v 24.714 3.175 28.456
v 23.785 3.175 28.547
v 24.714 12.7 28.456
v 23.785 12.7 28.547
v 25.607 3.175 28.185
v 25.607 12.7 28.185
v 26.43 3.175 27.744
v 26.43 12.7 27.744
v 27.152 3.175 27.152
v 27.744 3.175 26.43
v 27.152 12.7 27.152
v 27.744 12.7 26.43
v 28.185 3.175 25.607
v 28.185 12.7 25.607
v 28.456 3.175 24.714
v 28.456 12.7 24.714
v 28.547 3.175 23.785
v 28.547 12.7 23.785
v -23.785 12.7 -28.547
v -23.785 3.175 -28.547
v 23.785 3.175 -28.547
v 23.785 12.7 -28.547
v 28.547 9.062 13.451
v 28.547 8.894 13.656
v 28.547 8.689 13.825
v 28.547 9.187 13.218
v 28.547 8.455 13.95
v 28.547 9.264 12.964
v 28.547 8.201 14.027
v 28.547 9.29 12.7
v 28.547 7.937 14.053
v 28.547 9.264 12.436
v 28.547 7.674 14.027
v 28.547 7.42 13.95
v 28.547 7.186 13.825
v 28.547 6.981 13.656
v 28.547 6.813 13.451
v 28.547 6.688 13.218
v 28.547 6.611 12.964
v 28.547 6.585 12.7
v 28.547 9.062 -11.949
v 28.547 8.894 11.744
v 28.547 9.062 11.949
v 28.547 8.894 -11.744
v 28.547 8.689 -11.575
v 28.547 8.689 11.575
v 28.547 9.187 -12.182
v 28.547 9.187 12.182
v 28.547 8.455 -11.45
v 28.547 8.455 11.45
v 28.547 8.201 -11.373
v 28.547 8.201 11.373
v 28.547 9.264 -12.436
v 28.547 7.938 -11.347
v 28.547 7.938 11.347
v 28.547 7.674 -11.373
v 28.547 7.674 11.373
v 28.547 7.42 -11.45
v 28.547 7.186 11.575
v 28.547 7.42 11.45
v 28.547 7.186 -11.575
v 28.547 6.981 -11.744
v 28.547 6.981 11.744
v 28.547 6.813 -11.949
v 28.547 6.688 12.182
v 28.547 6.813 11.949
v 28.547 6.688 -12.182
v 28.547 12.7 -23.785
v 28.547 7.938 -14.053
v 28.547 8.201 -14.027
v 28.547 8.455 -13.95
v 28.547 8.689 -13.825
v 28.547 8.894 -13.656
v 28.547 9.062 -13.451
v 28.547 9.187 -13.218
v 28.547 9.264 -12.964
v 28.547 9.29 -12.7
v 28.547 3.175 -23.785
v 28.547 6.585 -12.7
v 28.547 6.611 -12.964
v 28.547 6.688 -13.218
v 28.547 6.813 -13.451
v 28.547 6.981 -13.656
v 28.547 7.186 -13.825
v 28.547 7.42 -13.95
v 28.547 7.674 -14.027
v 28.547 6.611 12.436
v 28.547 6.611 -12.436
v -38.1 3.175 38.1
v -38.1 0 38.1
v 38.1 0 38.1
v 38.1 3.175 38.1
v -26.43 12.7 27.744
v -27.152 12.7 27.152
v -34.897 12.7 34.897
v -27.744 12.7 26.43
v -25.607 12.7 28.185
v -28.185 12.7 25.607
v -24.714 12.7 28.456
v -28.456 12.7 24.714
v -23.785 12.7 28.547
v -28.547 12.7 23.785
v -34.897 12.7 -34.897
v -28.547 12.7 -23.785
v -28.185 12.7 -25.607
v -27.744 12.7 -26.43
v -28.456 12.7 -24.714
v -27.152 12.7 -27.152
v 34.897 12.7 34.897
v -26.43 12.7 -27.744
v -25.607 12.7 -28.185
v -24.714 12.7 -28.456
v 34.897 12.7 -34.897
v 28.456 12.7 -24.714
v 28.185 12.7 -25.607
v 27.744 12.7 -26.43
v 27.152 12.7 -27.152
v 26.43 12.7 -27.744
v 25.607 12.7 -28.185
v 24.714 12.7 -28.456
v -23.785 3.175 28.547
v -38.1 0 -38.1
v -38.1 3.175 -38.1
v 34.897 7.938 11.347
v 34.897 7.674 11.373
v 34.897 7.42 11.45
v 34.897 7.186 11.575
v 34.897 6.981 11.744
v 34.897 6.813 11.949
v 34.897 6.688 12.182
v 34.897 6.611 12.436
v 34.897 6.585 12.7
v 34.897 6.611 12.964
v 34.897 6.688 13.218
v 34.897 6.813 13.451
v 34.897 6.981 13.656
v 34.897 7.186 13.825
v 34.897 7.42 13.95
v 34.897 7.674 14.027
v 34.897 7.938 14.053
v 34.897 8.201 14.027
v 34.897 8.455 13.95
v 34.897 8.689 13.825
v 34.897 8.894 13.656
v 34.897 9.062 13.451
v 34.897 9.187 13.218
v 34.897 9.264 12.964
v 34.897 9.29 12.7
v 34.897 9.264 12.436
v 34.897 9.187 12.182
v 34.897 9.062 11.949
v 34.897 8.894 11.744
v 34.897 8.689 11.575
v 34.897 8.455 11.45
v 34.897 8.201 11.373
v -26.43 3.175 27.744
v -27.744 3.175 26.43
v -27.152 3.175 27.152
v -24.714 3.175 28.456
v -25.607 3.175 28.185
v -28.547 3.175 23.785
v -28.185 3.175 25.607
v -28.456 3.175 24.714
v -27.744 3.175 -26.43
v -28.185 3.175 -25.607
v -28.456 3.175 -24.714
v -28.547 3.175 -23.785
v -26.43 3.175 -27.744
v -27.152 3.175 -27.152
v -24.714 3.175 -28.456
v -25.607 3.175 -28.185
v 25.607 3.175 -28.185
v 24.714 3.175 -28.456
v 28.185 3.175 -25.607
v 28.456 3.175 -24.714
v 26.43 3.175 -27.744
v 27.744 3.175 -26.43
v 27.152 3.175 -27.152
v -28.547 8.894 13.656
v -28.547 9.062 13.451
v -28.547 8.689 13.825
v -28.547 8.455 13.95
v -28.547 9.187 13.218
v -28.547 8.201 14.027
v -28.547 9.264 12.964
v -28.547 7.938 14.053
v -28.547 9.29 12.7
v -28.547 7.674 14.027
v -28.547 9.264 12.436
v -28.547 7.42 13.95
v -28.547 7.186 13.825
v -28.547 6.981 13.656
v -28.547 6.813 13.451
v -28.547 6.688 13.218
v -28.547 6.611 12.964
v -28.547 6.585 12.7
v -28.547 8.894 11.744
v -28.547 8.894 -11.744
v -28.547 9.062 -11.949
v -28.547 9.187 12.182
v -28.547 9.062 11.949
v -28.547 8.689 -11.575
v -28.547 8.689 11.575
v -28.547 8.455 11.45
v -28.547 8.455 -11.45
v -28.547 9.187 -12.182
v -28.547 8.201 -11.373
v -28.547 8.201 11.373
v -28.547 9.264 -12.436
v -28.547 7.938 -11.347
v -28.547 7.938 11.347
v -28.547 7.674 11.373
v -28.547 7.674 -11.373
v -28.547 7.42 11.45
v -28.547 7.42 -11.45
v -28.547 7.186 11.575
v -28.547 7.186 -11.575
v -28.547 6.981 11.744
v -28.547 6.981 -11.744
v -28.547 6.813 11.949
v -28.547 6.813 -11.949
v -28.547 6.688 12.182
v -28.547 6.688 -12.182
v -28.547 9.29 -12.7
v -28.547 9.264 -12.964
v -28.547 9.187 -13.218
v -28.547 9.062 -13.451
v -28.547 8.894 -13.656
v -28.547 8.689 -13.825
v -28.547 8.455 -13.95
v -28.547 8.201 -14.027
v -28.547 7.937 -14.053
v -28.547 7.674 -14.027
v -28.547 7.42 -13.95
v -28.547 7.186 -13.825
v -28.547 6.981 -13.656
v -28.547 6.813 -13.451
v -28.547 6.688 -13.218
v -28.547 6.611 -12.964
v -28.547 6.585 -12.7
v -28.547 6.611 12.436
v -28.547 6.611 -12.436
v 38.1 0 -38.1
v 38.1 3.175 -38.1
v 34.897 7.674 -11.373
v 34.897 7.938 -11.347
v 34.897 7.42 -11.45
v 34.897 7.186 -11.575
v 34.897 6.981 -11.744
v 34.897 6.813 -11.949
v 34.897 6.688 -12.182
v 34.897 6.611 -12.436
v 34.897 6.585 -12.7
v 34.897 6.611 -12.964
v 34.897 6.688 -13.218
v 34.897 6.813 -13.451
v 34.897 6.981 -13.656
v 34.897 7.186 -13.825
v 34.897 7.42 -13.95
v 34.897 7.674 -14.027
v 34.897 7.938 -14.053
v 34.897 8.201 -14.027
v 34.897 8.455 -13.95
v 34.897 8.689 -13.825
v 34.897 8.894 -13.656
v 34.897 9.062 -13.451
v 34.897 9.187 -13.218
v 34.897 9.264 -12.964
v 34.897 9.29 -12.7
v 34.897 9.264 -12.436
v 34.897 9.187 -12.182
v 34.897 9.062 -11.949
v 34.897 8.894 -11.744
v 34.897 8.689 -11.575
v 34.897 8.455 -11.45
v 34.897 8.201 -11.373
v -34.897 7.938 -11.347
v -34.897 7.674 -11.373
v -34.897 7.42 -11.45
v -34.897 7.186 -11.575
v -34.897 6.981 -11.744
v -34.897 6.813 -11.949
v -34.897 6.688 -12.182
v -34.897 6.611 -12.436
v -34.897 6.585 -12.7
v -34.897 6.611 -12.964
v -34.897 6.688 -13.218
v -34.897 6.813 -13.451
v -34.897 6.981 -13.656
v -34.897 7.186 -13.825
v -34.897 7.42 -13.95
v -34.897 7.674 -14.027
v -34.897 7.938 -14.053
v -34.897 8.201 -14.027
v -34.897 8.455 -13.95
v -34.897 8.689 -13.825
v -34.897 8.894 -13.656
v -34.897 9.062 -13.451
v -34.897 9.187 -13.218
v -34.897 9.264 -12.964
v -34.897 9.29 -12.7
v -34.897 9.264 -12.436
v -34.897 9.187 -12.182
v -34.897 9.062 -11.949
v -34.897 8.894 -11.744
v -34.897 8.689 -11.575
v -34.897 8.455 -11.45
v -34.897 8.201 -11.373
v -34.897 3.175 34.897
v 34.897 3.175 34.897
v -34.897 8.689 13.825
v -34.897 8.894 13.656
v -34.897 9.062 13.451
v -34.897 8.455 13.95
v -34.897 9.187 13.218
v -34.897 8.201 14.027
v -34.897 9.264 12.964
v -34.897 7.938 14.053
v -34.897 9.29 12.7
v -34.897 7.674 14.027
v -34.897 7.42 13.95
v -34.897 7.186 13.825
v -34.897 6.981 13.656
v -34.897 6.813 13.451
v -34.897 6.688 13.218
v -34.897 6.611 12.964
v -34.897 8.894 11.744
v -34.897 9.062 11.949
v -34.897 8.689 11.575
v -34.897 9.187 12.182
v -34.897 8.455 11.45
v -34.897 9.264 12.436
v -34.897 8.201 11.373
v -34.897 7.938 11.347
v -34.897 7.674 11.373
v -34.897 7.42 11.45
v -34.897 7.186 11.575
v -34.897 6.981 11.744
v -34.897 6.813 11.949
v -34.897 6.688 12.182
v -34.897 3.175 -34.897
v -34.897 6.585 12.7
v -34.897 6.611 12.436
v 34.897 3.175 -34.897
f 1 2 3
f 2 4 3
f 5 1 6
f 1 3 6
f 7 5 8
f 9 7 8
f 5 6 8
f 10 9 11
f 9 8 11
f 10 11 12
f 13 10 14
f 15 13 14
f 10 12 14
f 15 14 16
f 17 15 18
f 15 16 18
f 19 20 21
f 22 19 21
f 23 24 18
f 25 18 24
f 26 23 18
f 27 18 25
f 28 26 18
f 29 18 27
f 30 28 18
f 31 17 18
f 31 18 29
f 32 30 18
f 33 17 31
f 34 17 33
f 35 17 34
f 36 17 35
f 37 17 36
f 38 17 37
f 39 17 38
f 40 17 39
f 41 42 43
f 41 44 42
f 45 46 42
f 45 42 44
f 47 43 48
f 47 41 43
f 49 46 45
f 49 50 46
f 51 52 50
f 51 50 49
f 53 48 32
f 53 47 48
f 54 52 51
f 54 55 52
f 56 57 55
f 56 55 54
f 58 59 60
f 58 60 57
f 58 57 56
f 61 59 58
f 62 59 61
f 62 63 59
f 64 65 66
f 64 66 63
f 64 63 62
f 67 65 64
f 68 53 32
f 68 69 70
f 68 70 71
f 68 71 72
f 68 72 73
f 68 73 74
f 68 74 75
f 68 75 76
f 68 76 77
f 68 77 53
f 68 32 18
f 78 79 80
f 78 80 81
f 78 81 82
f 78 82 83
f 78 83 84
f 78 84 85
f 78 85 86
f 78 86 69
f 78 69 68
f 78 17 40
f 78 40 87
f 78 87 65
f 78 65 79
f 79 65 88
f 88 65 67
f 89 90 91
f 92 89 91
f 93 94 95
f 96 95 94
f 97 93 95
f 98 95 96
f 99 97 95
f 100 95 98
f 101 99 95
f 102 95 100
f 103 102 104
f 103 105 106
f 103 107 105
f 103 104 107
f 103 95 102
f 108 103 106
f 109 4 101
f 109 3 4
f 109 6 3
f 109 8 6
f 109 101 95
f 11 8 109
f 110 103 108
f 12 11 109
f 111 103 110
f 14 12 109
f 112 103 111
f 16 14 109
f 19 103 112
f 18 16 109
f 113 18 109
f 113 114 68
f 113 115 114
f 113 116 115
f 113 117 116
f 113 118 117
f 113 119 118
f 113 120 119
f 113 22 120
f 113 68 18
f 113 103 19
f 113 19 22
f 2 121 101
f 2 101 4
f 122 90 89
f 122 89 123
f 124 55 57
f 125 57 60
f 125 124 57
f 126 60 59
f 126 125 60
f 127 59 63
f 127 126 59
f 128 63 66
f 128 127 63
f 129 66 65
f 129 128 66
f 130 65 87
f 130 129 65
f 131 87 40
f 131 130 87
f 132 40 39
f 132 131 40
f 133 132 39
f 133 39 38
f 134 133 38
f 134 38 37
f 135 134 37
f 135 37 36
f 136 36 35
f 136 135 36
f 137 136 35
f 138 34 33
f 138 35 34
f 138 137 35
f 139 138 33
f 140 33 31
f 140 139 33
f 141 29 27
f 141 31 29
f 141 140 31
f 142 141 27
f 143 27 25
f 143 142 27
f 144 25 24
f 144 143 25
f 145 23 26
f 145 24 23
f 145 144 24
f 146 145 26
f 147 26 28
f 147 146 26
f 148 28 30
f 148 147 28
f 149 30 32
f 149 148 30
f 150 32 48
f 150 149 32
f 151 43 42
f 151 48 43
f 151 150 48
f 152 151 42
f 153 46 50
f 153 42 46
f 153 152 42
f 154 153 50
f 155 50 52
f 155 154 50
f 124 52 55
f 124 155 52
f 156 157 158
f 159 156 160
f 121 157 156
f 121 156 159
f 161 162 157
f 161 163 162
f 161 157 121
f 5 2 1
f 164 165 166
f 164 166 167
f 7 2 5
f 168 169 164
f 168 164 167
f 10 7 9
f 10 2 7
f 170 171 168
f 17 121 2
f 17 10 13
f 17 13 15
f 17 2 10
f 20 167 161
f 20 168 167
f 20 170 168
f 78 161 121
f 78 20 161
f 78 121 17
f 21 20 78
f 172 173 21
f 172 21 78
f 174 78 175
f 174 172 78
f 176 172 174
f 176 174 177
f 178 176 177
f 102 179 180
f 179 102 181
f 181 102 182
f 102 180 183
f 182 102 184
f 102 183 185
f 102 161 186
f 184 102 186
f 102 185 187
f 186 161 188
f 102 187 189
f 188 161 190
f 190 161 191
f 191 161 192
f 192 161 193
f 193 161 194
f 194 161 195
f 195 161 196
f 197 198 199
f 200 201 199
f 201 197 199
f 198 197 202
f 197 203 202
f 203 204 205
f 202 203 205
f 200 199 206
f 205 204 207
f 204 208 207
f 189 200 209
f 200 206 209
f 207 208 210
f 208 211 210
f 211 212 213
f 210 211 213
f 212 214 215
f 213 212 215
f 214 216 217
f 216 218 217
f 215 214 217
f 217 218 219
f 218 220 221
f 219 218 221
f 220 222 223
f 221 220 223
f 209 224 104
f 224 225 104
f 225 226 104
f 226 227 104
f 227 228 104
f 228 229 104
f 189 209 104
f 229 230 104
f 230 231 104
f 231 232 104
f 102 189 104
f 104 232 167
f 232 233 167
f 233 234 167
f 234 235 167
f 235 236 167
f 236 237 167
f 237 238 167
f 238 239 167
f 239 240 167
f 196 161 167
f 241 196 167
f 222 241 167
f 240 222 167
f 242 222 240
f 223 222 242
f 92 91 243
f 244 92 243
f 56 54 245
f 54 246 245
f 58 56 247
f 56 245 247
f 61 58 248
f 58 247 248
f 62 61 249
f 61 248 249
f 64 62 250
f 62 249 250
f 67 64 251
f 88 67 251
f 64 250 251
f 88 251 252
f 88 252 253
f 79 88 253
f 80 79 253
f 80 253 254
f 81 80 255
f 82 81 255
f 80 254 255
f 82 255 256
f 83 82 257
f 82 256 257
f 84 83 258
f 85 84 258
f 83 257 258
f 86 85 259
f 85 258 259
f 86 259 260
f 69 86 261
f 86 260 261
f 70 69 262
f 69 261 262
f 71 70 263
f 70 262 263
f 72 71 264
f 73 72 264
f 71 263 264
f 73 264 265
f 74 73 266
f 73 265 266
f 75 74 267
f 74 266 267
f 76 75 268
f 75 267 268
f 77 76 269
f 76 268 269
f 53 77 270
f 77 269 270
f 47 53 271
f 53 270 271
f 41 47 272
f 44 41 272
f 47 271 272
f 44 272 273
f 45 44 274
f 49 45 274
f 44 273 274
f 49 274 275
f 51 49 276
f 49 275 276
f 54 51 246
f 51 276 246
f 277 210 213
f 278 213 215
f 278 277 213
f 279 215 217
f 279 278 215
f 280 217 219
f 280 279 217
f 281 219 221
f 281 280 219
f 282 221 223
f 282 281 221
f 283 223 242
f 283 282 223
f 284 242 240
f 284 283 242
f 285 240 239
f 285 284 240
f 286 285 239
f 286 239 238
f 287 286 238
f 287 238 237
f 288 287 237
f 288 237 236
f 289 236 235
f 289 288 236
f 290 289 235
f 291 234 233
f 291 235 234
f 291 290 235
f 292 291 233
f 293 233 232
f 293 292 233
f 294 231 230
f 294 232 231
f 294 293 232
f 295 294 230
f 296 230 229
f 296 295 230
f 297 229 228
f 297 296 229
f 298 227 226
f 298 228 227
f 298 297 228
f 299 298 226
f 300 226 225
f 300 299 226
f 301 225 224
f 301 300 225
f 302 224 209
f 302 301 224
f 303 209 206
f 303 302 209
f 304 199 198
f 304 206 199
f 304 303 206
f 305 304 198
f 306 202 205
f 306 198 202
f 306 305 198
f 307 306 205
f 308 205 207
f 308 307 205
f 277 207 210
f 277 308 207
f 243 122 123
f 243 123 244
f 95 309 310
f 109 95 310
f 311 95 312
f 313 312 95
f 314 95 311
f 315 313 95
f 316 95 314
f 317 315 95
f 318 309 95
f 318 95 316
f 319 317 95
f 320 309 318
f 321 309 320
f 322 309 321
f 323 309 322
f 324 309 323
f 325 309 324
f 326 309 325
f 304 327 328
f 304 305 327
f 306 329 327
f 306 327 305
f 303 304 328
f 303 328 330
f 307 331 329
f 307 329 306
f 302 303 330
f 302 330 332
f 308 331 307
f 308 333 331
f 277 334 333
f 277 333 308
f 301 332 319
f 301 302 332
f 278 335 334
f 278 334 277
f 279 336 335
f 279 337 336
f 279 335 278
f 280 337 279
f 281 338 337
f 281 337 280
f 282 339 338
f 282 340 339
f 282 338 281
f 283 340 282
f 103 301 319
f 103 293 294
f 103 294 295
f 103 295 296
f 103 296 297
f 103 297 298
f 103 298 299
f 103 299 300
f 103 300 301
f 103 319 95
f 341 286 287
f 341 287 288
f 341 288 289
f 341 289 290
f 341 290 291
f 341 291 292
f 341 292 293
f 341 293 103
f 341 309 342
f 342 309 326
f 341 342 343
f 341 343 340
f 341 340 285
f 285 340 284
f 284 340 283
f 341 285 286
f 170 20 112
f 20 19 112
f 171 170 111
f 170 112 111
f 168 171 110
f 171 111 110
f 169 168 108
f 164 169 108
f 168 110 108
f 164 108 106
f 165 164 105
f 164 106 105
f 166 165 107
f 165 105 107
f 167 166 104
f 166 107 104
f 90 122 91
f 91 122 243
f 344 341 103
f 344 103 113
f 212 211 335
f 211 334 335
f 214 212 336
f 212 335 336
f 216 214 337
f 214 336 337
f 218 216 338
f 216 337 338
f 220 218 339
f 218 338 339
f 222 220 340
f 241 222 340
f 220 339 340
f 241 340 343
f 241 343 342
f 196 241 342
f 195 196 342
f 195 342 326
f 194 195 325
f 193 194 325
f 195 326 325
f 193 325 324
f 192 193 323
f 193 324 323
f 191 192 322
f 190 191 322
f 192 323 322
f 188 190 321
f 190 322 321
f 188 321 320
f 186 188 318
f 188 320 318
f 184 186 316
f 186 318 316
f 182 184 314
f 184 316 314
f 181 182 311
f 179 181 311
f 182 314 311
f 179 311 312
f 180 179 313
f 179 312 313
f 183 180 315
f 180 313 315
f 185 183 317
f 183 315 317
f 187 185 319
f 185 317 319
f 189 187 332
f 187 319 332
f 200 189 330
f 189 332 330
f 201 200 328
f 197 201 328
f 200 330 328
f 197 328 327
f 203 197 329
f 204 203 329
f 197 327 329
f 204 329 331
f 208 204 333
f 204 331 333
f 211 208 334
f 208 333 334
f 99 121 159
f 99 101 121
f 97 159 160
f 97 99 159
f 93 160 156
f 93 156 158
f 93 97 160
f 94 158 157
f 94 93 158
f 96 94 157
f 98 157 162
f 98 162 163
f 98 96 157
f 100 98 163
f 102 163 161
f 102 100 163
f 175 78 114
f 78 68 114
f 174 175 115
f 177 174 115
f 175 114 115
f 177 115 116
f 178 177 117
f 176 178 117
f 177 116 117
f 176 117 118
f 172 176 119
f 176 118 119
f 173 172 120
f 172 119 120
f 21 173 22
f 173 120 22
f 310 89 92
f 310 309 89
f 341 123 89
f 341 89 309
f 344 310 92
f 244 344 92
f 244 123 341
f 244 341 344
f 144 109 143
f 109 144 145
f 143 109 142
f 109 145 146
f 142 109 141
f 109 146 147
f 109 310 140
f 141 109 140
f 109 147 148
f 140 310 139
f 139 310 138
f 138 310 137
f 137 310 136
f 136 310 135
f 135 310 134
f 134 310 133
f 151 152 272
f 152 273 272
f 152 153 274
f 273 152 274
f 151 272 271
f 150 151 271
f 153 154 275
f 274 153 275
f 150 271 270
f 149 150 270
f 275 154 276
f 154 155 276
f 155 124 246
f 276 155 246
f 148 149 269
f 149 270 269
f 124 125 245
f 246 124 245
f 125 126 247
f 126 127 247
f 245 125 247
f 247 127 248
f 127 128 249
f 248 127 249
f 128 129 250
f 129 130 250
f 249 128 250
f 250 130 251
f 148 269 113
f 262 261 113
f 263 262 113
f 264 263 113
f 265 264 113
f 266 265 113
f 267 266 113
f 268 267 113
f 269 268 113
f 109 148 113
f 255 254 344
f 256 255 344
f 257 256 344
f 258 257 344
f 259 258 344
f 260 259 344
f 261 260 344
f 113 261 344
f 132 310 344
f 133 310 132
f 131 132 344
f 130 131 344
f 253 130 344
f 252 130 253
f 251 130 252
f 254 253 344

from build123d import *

# Parameters (mm, degrees)
SKETCH1_W           = 76.2
SKETCH1_H           = 76.2
BOSS_EXTRUDE1_DEPTH = 3.175
SKETCH2_W           = 69.79412
SKETCH2_H           = 69.79412
SKETCH2_W_2         = 57.09412
SKETCH2_H_2         = 57.09412
BOSS_EXTRUDE2_DEPTH = 9.525
FILLET1_R           = 4.7625


with BuildPart() as part:
    # Sketch1 → Boss-Extrude1 (new body)
    with BuildSketch(Plane(origin=(0, 0, 0), x_dir=(1, 0, 0), z_dir=(0, 1, 0))):
        Rectangle(SKETCH1_W, SKETCH1_H)
    extrude(amount=BOSS_EXTRUDE1_DEPTH)

    # Sketch2 → Boss-Extrude2 (add)
    with BuildSketch(Plane(origin=(0, 3.175, 0), x_dir=(1, 0, 0), z_dir=(0, 1, 0))):
        Rectangle(SKETCH2_W, SKETCH2_H)
        Rectangle(SKETCH2_W_2, SKETCH2_H_2, mode=Mode.SUBTRACT)
    extrude(amount=BOSS_EXTRUDE2_DEPTH)

    # Fillet1
    fillet1_edges = [part.edges().sort_by_distance(p)[0] for p in [
        (-28.54706, 7.9375, 28.54706),
        (28.54706, 7.9375, 28.54706),
        (28.54706, 7.9375, -28.54706),
        (-28.54706, 7.9375, -28.54706),
    ]]
    fillet(fillet1_edges, radius=FILLET1_R)

    # Sketch9 → #6-32 Tapped Hole2 (revolve, cut)
    with BuildSketch(Plane(origin=(34.89706, 7.9375, 12.7), x_dir=(0, 0, -1), z_dir=(0, 1, 0))):
        Polygon((0, 0), (0, 11.98869403), (1.35255, 11.176), (1.35255, 0), align=None)
    f_6_32_tapped_hole2 = revolve(axis=Axis((41.24706, 7.9375, 12.7), (-1, 0, 0)), mode=Mode.SUBTRACT)

    # Mirror1: #6-32 Tapped Hole2 across plane
    add(f_6_32_tapped_hole2.mirror(Plane.XY), mode=Mode.SUBTRACT)

    # Mirror2: #6-32 Tapped Hole2 across plane
    add(f_6_32_tapped_hole2.mirror(Plane(origin=(0, 0, 0), x_dir=(0, 0, 1), z_dir=(1, 0, 0))), mode=Mode.SUBTRACT)

    # Mirror2 copy 1 sketch → Mirror2 copy 1 (revolve, cut)
    with BuildSketch(Plane(origin=(-34.89706, 7.9375, -12.7), x_dir=(0, 0, 1), z_dir=(0, 1, 0))):
        Polygon((0, 0), (0, 11.98869403), (1.35255, 11.176), (1.35255, 0), align=None)
    revolve(axis=Axis((-41.24706, 7.9375, -12.7), (1, 0, 0)), mode=Mode.SUBTRACT)


solid = part.part
